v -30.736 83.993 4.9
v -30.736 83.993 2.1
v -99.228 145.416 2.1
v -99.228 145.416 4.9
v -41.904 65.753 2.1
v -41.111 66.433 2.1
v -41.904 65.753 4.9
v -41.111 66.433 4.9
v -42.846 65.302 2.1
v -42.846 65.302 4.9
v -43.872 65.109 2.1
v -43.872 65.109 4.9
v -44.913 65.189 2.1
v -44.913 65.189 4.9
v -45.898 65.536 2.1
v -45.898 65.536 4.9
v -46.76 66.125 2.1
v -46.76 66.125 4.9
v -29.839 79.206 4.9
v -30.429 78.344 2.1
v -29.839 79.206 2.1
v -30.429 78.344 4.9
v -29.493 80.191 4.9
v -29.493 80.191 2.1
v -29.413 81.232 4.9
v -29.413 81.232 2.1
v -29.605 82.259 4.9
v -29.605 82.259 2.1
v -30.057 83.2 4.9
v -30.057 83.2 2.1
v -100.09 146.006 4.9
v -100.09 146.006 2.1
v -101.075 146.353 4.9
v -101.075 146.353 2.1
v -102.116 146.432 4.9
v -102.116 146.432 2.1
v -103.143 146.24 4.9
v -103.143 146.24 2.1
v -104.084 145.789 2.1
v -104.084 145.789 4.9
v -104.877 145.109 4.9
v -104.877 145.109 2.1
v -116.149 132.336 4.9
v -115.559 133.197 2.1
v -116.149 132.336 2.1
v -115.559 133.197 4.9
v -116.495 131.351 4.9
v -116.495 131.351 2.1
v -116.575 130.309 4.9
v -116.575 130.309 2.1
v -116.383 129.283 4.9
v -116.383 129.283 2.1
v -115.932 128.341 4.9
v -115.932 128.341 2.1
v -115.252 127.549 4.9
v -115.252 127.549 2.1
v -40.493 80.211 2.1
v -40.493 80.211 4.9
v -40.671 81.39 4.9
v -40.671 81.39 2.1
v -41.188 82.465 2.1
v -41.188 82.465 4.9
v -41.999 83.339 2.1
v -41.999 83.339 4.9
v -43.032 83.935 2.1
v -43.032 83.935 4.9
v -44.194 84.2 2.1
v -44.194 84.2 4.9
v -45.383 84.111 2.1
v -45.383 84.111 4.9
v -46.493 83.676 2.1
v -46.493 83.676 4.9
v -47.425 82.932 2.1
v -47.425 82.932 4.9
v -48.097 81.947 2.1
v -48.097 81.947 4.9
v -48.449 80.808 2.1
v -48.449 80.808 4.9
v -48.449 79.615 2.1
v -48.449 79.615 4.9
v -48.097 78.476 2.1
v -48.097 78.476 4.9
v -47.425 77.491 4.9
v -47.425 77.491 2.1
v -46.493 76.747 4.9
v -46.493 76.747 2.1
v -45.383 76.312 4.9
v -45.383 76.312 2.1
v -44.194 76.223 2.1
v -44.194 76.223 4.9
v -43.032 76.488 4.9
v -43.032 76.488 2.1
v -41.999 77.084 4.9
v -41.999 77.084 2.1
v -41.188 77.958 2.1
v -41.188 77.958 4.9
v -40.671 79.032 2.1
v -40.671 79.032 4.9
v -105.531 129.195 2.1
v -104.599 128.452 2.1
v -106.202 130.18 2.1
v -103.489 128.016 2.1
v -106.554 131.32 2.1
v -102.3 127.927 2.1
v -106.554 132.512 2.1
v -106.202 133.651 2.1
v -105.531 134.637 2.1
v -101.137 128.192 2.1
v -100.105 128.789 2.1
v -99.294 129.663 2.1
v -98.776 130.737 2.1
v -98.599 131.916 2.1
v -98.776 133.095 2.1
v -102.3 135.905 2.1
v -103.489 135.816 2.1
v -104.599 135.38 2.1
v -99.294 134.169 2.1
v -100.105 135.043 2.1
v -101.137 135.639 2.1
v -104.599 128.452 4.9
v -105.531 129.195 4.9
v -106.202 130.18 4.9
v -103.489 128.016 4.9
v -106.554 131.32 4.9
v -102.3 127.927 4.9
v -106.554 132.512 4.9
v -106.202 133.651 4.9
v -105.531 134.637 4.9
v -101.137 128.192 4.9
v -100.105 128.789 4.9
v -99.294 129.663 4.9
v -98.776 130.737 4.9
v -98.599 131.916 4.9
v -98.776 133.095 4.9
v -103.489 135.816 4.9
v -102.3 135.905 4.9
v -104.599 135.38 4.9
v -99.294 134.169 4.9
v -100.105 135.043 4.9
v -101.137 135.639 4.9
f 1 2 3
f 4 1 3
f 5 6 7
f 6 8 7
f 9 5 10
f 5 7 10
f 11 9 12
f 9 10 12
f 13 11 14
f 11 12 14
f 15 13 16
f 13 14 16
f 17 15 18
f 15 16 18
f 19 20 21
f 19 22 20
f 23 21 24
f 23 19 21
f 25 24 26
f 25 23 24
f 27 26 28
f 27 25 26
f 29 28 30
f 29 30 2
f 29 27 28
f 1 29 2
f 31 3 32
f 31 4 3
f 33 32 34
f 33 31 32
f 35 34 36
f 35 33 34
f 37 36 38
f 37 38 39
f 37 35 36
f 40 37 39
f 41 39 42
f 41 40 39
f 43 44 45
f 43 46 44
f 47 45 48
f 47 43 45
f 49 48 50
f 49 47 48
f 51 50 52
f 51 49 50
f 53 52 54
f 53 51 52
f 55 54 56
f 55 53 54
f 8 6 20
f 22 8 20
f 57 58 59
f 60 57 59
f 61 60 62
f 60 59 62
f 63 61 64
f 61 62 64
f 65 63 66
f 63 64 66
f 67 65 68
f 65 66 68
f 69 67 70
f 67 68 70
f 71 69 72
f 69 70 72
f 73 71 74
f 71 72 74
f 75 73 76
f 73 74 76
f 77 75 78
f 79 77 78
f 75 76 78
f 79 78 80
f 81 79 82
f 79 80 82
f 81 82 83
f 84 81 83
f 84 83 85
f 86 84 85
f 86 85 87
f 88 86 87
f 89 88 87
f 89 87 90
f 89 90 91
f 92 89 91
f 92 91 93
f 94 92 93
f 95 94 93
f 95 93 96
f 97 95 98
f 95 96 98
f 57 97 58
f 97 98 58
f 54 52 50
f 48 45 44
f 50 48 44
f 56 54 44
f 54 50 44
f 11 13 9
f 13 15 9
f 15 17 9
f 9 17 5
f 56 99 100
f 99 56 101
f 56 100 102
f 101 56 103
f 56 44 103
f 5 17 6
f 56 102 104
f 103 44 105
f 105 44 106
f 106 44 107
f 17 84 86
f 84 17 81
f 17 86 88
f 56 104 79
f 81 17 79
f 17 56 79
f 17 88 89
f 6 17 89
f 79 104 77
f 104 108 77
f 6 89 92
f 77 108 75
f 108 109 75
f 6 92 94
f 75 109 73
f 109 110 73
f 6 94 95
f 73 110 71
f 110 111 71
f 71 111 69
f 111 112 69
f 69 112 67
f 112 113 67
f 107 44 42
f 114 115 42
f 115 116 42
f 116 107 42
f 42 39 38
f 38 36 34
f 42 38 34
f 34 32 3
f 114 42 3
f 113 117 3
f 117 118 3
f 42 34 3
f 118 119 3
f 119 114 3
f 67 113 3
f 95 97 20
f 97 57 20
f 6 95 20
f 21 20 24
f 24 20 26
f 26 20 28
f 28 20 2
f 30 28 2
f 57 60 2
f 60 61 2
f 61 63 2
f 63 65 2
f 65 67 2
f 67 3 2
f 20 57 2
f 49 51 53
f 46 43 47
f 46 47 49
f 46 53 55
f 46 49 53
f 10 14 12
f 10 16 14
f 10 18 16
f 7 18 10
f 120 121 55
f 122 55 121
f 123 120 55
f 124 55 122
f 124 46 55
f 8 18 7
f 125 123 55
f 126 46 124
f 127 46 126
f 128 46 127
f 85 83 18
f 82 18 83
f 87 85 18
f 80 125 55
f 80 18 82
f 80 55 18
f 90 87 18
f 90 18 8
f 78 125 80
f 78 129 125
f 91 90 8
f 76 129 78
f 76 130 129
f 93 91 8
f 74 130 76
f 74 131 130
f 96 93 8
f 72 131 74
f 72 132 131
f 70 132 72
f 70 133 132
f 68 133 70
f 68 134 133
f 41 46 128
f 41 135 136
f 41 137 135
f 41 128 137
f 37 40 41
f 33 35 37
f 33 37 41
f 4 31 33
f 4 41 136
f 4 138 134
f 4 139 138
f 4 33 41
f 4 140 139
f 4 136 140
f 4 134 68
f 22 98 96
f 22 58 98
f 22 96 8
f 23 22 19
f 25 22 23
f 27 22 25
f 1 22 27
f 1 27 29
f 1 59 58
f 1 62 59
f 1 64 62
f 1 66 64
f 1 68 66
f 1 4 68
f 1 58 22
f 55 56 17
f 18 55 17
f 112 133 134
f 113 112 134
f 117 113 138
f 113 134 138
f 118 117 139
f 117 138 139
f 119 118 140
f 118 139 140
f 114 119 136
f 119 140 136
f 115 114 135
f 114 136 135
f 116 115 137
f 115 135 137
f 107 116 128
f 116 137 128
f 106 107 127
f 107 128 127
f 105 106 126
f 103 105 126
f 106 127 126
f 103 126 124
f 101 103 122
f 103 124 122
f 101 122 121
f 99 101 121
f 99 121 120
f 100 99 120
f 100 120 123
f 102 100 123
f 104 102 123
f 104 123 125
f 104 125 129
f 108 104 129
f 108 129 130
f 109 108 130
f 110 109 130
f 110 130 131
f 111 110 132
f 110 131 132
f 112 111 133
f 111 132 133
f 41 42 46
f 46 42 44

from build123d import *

# Parameters (mm, degrees)
BOSS_EXTRUDE1_DEPTH = 7
FILLET1_R           = 10
SKETCH3_R           = 10
CUT_EXTRUDE1_DEPTH  = 7
SCALE1_SCALE        = 0.2
SCALE2_SCALE        = 2.5
SCALE3_SCALE        = 0.8


with BuildPart() as part:
    # Sketch1 → Boss-Extrude1 (new body)
    with BuildSketch(Plane.XY):
        Polygon((0, 0), (40.058778279, 44.668717049), (-146.060876092, 211.580293211), (-186.119654371, 166.911576162), align=None)
    extrude(amount=BOSS_EXTRUDE1_DEPTH)

    # Fillet1
    fillet1_edges = [part.edges().sort_by_distance(p)[0] for p in [
        (-186.119654371, 166.911576162, 3.5),
        (-146.060876092, 211.580293211, 3.5),
        (40.058778279, 44.668717049, 3.5),
        (0, 0, 3.5),
    ]]
    fillet(fillet1_edges, radius=FILLET1_R)

    # Sketch3 → Cut-Extrude1 (cut)
    with BuildSketch(Plane.XY.offset(7)):
        with Locations((-1.778551095, 41.89165724)):
            Circle(SKETCH3_R)
        with Locations((-147.041782503, 171.152655791)):
            Circle(SKETCH3_R)
    extrude(amount=-CUT_EXTRUDE1_DEPTH, mode=Mode.SUBTRACT)


with BuildPart() as part_1:
    # Scale1: scaled about (-72.969754943, 105.757951413, 3.5)
    add(part.part.scale(SCALE1_SCALE).moved(Location((-58.375803954, 84.60636113, 2.8))))


with BuildPart() as part_2:
    # Scale2: scaled about (-72.969754943, 105.757951413, 3.5)
    add(part_1.part.scale(SCALE2_SCALE).moved(Location((109.454632414, -158.63692712, -5.25))))


with BuildPart() as part_3:
    # Scale3: scaled about (-72.969754943, 105.757951413, 3.5)
    add(part_2.part.scale(SCALE3_SCALE).moved(Location((-14.593950989, 21.151590283, 0.7))))


solid = part_3.part
